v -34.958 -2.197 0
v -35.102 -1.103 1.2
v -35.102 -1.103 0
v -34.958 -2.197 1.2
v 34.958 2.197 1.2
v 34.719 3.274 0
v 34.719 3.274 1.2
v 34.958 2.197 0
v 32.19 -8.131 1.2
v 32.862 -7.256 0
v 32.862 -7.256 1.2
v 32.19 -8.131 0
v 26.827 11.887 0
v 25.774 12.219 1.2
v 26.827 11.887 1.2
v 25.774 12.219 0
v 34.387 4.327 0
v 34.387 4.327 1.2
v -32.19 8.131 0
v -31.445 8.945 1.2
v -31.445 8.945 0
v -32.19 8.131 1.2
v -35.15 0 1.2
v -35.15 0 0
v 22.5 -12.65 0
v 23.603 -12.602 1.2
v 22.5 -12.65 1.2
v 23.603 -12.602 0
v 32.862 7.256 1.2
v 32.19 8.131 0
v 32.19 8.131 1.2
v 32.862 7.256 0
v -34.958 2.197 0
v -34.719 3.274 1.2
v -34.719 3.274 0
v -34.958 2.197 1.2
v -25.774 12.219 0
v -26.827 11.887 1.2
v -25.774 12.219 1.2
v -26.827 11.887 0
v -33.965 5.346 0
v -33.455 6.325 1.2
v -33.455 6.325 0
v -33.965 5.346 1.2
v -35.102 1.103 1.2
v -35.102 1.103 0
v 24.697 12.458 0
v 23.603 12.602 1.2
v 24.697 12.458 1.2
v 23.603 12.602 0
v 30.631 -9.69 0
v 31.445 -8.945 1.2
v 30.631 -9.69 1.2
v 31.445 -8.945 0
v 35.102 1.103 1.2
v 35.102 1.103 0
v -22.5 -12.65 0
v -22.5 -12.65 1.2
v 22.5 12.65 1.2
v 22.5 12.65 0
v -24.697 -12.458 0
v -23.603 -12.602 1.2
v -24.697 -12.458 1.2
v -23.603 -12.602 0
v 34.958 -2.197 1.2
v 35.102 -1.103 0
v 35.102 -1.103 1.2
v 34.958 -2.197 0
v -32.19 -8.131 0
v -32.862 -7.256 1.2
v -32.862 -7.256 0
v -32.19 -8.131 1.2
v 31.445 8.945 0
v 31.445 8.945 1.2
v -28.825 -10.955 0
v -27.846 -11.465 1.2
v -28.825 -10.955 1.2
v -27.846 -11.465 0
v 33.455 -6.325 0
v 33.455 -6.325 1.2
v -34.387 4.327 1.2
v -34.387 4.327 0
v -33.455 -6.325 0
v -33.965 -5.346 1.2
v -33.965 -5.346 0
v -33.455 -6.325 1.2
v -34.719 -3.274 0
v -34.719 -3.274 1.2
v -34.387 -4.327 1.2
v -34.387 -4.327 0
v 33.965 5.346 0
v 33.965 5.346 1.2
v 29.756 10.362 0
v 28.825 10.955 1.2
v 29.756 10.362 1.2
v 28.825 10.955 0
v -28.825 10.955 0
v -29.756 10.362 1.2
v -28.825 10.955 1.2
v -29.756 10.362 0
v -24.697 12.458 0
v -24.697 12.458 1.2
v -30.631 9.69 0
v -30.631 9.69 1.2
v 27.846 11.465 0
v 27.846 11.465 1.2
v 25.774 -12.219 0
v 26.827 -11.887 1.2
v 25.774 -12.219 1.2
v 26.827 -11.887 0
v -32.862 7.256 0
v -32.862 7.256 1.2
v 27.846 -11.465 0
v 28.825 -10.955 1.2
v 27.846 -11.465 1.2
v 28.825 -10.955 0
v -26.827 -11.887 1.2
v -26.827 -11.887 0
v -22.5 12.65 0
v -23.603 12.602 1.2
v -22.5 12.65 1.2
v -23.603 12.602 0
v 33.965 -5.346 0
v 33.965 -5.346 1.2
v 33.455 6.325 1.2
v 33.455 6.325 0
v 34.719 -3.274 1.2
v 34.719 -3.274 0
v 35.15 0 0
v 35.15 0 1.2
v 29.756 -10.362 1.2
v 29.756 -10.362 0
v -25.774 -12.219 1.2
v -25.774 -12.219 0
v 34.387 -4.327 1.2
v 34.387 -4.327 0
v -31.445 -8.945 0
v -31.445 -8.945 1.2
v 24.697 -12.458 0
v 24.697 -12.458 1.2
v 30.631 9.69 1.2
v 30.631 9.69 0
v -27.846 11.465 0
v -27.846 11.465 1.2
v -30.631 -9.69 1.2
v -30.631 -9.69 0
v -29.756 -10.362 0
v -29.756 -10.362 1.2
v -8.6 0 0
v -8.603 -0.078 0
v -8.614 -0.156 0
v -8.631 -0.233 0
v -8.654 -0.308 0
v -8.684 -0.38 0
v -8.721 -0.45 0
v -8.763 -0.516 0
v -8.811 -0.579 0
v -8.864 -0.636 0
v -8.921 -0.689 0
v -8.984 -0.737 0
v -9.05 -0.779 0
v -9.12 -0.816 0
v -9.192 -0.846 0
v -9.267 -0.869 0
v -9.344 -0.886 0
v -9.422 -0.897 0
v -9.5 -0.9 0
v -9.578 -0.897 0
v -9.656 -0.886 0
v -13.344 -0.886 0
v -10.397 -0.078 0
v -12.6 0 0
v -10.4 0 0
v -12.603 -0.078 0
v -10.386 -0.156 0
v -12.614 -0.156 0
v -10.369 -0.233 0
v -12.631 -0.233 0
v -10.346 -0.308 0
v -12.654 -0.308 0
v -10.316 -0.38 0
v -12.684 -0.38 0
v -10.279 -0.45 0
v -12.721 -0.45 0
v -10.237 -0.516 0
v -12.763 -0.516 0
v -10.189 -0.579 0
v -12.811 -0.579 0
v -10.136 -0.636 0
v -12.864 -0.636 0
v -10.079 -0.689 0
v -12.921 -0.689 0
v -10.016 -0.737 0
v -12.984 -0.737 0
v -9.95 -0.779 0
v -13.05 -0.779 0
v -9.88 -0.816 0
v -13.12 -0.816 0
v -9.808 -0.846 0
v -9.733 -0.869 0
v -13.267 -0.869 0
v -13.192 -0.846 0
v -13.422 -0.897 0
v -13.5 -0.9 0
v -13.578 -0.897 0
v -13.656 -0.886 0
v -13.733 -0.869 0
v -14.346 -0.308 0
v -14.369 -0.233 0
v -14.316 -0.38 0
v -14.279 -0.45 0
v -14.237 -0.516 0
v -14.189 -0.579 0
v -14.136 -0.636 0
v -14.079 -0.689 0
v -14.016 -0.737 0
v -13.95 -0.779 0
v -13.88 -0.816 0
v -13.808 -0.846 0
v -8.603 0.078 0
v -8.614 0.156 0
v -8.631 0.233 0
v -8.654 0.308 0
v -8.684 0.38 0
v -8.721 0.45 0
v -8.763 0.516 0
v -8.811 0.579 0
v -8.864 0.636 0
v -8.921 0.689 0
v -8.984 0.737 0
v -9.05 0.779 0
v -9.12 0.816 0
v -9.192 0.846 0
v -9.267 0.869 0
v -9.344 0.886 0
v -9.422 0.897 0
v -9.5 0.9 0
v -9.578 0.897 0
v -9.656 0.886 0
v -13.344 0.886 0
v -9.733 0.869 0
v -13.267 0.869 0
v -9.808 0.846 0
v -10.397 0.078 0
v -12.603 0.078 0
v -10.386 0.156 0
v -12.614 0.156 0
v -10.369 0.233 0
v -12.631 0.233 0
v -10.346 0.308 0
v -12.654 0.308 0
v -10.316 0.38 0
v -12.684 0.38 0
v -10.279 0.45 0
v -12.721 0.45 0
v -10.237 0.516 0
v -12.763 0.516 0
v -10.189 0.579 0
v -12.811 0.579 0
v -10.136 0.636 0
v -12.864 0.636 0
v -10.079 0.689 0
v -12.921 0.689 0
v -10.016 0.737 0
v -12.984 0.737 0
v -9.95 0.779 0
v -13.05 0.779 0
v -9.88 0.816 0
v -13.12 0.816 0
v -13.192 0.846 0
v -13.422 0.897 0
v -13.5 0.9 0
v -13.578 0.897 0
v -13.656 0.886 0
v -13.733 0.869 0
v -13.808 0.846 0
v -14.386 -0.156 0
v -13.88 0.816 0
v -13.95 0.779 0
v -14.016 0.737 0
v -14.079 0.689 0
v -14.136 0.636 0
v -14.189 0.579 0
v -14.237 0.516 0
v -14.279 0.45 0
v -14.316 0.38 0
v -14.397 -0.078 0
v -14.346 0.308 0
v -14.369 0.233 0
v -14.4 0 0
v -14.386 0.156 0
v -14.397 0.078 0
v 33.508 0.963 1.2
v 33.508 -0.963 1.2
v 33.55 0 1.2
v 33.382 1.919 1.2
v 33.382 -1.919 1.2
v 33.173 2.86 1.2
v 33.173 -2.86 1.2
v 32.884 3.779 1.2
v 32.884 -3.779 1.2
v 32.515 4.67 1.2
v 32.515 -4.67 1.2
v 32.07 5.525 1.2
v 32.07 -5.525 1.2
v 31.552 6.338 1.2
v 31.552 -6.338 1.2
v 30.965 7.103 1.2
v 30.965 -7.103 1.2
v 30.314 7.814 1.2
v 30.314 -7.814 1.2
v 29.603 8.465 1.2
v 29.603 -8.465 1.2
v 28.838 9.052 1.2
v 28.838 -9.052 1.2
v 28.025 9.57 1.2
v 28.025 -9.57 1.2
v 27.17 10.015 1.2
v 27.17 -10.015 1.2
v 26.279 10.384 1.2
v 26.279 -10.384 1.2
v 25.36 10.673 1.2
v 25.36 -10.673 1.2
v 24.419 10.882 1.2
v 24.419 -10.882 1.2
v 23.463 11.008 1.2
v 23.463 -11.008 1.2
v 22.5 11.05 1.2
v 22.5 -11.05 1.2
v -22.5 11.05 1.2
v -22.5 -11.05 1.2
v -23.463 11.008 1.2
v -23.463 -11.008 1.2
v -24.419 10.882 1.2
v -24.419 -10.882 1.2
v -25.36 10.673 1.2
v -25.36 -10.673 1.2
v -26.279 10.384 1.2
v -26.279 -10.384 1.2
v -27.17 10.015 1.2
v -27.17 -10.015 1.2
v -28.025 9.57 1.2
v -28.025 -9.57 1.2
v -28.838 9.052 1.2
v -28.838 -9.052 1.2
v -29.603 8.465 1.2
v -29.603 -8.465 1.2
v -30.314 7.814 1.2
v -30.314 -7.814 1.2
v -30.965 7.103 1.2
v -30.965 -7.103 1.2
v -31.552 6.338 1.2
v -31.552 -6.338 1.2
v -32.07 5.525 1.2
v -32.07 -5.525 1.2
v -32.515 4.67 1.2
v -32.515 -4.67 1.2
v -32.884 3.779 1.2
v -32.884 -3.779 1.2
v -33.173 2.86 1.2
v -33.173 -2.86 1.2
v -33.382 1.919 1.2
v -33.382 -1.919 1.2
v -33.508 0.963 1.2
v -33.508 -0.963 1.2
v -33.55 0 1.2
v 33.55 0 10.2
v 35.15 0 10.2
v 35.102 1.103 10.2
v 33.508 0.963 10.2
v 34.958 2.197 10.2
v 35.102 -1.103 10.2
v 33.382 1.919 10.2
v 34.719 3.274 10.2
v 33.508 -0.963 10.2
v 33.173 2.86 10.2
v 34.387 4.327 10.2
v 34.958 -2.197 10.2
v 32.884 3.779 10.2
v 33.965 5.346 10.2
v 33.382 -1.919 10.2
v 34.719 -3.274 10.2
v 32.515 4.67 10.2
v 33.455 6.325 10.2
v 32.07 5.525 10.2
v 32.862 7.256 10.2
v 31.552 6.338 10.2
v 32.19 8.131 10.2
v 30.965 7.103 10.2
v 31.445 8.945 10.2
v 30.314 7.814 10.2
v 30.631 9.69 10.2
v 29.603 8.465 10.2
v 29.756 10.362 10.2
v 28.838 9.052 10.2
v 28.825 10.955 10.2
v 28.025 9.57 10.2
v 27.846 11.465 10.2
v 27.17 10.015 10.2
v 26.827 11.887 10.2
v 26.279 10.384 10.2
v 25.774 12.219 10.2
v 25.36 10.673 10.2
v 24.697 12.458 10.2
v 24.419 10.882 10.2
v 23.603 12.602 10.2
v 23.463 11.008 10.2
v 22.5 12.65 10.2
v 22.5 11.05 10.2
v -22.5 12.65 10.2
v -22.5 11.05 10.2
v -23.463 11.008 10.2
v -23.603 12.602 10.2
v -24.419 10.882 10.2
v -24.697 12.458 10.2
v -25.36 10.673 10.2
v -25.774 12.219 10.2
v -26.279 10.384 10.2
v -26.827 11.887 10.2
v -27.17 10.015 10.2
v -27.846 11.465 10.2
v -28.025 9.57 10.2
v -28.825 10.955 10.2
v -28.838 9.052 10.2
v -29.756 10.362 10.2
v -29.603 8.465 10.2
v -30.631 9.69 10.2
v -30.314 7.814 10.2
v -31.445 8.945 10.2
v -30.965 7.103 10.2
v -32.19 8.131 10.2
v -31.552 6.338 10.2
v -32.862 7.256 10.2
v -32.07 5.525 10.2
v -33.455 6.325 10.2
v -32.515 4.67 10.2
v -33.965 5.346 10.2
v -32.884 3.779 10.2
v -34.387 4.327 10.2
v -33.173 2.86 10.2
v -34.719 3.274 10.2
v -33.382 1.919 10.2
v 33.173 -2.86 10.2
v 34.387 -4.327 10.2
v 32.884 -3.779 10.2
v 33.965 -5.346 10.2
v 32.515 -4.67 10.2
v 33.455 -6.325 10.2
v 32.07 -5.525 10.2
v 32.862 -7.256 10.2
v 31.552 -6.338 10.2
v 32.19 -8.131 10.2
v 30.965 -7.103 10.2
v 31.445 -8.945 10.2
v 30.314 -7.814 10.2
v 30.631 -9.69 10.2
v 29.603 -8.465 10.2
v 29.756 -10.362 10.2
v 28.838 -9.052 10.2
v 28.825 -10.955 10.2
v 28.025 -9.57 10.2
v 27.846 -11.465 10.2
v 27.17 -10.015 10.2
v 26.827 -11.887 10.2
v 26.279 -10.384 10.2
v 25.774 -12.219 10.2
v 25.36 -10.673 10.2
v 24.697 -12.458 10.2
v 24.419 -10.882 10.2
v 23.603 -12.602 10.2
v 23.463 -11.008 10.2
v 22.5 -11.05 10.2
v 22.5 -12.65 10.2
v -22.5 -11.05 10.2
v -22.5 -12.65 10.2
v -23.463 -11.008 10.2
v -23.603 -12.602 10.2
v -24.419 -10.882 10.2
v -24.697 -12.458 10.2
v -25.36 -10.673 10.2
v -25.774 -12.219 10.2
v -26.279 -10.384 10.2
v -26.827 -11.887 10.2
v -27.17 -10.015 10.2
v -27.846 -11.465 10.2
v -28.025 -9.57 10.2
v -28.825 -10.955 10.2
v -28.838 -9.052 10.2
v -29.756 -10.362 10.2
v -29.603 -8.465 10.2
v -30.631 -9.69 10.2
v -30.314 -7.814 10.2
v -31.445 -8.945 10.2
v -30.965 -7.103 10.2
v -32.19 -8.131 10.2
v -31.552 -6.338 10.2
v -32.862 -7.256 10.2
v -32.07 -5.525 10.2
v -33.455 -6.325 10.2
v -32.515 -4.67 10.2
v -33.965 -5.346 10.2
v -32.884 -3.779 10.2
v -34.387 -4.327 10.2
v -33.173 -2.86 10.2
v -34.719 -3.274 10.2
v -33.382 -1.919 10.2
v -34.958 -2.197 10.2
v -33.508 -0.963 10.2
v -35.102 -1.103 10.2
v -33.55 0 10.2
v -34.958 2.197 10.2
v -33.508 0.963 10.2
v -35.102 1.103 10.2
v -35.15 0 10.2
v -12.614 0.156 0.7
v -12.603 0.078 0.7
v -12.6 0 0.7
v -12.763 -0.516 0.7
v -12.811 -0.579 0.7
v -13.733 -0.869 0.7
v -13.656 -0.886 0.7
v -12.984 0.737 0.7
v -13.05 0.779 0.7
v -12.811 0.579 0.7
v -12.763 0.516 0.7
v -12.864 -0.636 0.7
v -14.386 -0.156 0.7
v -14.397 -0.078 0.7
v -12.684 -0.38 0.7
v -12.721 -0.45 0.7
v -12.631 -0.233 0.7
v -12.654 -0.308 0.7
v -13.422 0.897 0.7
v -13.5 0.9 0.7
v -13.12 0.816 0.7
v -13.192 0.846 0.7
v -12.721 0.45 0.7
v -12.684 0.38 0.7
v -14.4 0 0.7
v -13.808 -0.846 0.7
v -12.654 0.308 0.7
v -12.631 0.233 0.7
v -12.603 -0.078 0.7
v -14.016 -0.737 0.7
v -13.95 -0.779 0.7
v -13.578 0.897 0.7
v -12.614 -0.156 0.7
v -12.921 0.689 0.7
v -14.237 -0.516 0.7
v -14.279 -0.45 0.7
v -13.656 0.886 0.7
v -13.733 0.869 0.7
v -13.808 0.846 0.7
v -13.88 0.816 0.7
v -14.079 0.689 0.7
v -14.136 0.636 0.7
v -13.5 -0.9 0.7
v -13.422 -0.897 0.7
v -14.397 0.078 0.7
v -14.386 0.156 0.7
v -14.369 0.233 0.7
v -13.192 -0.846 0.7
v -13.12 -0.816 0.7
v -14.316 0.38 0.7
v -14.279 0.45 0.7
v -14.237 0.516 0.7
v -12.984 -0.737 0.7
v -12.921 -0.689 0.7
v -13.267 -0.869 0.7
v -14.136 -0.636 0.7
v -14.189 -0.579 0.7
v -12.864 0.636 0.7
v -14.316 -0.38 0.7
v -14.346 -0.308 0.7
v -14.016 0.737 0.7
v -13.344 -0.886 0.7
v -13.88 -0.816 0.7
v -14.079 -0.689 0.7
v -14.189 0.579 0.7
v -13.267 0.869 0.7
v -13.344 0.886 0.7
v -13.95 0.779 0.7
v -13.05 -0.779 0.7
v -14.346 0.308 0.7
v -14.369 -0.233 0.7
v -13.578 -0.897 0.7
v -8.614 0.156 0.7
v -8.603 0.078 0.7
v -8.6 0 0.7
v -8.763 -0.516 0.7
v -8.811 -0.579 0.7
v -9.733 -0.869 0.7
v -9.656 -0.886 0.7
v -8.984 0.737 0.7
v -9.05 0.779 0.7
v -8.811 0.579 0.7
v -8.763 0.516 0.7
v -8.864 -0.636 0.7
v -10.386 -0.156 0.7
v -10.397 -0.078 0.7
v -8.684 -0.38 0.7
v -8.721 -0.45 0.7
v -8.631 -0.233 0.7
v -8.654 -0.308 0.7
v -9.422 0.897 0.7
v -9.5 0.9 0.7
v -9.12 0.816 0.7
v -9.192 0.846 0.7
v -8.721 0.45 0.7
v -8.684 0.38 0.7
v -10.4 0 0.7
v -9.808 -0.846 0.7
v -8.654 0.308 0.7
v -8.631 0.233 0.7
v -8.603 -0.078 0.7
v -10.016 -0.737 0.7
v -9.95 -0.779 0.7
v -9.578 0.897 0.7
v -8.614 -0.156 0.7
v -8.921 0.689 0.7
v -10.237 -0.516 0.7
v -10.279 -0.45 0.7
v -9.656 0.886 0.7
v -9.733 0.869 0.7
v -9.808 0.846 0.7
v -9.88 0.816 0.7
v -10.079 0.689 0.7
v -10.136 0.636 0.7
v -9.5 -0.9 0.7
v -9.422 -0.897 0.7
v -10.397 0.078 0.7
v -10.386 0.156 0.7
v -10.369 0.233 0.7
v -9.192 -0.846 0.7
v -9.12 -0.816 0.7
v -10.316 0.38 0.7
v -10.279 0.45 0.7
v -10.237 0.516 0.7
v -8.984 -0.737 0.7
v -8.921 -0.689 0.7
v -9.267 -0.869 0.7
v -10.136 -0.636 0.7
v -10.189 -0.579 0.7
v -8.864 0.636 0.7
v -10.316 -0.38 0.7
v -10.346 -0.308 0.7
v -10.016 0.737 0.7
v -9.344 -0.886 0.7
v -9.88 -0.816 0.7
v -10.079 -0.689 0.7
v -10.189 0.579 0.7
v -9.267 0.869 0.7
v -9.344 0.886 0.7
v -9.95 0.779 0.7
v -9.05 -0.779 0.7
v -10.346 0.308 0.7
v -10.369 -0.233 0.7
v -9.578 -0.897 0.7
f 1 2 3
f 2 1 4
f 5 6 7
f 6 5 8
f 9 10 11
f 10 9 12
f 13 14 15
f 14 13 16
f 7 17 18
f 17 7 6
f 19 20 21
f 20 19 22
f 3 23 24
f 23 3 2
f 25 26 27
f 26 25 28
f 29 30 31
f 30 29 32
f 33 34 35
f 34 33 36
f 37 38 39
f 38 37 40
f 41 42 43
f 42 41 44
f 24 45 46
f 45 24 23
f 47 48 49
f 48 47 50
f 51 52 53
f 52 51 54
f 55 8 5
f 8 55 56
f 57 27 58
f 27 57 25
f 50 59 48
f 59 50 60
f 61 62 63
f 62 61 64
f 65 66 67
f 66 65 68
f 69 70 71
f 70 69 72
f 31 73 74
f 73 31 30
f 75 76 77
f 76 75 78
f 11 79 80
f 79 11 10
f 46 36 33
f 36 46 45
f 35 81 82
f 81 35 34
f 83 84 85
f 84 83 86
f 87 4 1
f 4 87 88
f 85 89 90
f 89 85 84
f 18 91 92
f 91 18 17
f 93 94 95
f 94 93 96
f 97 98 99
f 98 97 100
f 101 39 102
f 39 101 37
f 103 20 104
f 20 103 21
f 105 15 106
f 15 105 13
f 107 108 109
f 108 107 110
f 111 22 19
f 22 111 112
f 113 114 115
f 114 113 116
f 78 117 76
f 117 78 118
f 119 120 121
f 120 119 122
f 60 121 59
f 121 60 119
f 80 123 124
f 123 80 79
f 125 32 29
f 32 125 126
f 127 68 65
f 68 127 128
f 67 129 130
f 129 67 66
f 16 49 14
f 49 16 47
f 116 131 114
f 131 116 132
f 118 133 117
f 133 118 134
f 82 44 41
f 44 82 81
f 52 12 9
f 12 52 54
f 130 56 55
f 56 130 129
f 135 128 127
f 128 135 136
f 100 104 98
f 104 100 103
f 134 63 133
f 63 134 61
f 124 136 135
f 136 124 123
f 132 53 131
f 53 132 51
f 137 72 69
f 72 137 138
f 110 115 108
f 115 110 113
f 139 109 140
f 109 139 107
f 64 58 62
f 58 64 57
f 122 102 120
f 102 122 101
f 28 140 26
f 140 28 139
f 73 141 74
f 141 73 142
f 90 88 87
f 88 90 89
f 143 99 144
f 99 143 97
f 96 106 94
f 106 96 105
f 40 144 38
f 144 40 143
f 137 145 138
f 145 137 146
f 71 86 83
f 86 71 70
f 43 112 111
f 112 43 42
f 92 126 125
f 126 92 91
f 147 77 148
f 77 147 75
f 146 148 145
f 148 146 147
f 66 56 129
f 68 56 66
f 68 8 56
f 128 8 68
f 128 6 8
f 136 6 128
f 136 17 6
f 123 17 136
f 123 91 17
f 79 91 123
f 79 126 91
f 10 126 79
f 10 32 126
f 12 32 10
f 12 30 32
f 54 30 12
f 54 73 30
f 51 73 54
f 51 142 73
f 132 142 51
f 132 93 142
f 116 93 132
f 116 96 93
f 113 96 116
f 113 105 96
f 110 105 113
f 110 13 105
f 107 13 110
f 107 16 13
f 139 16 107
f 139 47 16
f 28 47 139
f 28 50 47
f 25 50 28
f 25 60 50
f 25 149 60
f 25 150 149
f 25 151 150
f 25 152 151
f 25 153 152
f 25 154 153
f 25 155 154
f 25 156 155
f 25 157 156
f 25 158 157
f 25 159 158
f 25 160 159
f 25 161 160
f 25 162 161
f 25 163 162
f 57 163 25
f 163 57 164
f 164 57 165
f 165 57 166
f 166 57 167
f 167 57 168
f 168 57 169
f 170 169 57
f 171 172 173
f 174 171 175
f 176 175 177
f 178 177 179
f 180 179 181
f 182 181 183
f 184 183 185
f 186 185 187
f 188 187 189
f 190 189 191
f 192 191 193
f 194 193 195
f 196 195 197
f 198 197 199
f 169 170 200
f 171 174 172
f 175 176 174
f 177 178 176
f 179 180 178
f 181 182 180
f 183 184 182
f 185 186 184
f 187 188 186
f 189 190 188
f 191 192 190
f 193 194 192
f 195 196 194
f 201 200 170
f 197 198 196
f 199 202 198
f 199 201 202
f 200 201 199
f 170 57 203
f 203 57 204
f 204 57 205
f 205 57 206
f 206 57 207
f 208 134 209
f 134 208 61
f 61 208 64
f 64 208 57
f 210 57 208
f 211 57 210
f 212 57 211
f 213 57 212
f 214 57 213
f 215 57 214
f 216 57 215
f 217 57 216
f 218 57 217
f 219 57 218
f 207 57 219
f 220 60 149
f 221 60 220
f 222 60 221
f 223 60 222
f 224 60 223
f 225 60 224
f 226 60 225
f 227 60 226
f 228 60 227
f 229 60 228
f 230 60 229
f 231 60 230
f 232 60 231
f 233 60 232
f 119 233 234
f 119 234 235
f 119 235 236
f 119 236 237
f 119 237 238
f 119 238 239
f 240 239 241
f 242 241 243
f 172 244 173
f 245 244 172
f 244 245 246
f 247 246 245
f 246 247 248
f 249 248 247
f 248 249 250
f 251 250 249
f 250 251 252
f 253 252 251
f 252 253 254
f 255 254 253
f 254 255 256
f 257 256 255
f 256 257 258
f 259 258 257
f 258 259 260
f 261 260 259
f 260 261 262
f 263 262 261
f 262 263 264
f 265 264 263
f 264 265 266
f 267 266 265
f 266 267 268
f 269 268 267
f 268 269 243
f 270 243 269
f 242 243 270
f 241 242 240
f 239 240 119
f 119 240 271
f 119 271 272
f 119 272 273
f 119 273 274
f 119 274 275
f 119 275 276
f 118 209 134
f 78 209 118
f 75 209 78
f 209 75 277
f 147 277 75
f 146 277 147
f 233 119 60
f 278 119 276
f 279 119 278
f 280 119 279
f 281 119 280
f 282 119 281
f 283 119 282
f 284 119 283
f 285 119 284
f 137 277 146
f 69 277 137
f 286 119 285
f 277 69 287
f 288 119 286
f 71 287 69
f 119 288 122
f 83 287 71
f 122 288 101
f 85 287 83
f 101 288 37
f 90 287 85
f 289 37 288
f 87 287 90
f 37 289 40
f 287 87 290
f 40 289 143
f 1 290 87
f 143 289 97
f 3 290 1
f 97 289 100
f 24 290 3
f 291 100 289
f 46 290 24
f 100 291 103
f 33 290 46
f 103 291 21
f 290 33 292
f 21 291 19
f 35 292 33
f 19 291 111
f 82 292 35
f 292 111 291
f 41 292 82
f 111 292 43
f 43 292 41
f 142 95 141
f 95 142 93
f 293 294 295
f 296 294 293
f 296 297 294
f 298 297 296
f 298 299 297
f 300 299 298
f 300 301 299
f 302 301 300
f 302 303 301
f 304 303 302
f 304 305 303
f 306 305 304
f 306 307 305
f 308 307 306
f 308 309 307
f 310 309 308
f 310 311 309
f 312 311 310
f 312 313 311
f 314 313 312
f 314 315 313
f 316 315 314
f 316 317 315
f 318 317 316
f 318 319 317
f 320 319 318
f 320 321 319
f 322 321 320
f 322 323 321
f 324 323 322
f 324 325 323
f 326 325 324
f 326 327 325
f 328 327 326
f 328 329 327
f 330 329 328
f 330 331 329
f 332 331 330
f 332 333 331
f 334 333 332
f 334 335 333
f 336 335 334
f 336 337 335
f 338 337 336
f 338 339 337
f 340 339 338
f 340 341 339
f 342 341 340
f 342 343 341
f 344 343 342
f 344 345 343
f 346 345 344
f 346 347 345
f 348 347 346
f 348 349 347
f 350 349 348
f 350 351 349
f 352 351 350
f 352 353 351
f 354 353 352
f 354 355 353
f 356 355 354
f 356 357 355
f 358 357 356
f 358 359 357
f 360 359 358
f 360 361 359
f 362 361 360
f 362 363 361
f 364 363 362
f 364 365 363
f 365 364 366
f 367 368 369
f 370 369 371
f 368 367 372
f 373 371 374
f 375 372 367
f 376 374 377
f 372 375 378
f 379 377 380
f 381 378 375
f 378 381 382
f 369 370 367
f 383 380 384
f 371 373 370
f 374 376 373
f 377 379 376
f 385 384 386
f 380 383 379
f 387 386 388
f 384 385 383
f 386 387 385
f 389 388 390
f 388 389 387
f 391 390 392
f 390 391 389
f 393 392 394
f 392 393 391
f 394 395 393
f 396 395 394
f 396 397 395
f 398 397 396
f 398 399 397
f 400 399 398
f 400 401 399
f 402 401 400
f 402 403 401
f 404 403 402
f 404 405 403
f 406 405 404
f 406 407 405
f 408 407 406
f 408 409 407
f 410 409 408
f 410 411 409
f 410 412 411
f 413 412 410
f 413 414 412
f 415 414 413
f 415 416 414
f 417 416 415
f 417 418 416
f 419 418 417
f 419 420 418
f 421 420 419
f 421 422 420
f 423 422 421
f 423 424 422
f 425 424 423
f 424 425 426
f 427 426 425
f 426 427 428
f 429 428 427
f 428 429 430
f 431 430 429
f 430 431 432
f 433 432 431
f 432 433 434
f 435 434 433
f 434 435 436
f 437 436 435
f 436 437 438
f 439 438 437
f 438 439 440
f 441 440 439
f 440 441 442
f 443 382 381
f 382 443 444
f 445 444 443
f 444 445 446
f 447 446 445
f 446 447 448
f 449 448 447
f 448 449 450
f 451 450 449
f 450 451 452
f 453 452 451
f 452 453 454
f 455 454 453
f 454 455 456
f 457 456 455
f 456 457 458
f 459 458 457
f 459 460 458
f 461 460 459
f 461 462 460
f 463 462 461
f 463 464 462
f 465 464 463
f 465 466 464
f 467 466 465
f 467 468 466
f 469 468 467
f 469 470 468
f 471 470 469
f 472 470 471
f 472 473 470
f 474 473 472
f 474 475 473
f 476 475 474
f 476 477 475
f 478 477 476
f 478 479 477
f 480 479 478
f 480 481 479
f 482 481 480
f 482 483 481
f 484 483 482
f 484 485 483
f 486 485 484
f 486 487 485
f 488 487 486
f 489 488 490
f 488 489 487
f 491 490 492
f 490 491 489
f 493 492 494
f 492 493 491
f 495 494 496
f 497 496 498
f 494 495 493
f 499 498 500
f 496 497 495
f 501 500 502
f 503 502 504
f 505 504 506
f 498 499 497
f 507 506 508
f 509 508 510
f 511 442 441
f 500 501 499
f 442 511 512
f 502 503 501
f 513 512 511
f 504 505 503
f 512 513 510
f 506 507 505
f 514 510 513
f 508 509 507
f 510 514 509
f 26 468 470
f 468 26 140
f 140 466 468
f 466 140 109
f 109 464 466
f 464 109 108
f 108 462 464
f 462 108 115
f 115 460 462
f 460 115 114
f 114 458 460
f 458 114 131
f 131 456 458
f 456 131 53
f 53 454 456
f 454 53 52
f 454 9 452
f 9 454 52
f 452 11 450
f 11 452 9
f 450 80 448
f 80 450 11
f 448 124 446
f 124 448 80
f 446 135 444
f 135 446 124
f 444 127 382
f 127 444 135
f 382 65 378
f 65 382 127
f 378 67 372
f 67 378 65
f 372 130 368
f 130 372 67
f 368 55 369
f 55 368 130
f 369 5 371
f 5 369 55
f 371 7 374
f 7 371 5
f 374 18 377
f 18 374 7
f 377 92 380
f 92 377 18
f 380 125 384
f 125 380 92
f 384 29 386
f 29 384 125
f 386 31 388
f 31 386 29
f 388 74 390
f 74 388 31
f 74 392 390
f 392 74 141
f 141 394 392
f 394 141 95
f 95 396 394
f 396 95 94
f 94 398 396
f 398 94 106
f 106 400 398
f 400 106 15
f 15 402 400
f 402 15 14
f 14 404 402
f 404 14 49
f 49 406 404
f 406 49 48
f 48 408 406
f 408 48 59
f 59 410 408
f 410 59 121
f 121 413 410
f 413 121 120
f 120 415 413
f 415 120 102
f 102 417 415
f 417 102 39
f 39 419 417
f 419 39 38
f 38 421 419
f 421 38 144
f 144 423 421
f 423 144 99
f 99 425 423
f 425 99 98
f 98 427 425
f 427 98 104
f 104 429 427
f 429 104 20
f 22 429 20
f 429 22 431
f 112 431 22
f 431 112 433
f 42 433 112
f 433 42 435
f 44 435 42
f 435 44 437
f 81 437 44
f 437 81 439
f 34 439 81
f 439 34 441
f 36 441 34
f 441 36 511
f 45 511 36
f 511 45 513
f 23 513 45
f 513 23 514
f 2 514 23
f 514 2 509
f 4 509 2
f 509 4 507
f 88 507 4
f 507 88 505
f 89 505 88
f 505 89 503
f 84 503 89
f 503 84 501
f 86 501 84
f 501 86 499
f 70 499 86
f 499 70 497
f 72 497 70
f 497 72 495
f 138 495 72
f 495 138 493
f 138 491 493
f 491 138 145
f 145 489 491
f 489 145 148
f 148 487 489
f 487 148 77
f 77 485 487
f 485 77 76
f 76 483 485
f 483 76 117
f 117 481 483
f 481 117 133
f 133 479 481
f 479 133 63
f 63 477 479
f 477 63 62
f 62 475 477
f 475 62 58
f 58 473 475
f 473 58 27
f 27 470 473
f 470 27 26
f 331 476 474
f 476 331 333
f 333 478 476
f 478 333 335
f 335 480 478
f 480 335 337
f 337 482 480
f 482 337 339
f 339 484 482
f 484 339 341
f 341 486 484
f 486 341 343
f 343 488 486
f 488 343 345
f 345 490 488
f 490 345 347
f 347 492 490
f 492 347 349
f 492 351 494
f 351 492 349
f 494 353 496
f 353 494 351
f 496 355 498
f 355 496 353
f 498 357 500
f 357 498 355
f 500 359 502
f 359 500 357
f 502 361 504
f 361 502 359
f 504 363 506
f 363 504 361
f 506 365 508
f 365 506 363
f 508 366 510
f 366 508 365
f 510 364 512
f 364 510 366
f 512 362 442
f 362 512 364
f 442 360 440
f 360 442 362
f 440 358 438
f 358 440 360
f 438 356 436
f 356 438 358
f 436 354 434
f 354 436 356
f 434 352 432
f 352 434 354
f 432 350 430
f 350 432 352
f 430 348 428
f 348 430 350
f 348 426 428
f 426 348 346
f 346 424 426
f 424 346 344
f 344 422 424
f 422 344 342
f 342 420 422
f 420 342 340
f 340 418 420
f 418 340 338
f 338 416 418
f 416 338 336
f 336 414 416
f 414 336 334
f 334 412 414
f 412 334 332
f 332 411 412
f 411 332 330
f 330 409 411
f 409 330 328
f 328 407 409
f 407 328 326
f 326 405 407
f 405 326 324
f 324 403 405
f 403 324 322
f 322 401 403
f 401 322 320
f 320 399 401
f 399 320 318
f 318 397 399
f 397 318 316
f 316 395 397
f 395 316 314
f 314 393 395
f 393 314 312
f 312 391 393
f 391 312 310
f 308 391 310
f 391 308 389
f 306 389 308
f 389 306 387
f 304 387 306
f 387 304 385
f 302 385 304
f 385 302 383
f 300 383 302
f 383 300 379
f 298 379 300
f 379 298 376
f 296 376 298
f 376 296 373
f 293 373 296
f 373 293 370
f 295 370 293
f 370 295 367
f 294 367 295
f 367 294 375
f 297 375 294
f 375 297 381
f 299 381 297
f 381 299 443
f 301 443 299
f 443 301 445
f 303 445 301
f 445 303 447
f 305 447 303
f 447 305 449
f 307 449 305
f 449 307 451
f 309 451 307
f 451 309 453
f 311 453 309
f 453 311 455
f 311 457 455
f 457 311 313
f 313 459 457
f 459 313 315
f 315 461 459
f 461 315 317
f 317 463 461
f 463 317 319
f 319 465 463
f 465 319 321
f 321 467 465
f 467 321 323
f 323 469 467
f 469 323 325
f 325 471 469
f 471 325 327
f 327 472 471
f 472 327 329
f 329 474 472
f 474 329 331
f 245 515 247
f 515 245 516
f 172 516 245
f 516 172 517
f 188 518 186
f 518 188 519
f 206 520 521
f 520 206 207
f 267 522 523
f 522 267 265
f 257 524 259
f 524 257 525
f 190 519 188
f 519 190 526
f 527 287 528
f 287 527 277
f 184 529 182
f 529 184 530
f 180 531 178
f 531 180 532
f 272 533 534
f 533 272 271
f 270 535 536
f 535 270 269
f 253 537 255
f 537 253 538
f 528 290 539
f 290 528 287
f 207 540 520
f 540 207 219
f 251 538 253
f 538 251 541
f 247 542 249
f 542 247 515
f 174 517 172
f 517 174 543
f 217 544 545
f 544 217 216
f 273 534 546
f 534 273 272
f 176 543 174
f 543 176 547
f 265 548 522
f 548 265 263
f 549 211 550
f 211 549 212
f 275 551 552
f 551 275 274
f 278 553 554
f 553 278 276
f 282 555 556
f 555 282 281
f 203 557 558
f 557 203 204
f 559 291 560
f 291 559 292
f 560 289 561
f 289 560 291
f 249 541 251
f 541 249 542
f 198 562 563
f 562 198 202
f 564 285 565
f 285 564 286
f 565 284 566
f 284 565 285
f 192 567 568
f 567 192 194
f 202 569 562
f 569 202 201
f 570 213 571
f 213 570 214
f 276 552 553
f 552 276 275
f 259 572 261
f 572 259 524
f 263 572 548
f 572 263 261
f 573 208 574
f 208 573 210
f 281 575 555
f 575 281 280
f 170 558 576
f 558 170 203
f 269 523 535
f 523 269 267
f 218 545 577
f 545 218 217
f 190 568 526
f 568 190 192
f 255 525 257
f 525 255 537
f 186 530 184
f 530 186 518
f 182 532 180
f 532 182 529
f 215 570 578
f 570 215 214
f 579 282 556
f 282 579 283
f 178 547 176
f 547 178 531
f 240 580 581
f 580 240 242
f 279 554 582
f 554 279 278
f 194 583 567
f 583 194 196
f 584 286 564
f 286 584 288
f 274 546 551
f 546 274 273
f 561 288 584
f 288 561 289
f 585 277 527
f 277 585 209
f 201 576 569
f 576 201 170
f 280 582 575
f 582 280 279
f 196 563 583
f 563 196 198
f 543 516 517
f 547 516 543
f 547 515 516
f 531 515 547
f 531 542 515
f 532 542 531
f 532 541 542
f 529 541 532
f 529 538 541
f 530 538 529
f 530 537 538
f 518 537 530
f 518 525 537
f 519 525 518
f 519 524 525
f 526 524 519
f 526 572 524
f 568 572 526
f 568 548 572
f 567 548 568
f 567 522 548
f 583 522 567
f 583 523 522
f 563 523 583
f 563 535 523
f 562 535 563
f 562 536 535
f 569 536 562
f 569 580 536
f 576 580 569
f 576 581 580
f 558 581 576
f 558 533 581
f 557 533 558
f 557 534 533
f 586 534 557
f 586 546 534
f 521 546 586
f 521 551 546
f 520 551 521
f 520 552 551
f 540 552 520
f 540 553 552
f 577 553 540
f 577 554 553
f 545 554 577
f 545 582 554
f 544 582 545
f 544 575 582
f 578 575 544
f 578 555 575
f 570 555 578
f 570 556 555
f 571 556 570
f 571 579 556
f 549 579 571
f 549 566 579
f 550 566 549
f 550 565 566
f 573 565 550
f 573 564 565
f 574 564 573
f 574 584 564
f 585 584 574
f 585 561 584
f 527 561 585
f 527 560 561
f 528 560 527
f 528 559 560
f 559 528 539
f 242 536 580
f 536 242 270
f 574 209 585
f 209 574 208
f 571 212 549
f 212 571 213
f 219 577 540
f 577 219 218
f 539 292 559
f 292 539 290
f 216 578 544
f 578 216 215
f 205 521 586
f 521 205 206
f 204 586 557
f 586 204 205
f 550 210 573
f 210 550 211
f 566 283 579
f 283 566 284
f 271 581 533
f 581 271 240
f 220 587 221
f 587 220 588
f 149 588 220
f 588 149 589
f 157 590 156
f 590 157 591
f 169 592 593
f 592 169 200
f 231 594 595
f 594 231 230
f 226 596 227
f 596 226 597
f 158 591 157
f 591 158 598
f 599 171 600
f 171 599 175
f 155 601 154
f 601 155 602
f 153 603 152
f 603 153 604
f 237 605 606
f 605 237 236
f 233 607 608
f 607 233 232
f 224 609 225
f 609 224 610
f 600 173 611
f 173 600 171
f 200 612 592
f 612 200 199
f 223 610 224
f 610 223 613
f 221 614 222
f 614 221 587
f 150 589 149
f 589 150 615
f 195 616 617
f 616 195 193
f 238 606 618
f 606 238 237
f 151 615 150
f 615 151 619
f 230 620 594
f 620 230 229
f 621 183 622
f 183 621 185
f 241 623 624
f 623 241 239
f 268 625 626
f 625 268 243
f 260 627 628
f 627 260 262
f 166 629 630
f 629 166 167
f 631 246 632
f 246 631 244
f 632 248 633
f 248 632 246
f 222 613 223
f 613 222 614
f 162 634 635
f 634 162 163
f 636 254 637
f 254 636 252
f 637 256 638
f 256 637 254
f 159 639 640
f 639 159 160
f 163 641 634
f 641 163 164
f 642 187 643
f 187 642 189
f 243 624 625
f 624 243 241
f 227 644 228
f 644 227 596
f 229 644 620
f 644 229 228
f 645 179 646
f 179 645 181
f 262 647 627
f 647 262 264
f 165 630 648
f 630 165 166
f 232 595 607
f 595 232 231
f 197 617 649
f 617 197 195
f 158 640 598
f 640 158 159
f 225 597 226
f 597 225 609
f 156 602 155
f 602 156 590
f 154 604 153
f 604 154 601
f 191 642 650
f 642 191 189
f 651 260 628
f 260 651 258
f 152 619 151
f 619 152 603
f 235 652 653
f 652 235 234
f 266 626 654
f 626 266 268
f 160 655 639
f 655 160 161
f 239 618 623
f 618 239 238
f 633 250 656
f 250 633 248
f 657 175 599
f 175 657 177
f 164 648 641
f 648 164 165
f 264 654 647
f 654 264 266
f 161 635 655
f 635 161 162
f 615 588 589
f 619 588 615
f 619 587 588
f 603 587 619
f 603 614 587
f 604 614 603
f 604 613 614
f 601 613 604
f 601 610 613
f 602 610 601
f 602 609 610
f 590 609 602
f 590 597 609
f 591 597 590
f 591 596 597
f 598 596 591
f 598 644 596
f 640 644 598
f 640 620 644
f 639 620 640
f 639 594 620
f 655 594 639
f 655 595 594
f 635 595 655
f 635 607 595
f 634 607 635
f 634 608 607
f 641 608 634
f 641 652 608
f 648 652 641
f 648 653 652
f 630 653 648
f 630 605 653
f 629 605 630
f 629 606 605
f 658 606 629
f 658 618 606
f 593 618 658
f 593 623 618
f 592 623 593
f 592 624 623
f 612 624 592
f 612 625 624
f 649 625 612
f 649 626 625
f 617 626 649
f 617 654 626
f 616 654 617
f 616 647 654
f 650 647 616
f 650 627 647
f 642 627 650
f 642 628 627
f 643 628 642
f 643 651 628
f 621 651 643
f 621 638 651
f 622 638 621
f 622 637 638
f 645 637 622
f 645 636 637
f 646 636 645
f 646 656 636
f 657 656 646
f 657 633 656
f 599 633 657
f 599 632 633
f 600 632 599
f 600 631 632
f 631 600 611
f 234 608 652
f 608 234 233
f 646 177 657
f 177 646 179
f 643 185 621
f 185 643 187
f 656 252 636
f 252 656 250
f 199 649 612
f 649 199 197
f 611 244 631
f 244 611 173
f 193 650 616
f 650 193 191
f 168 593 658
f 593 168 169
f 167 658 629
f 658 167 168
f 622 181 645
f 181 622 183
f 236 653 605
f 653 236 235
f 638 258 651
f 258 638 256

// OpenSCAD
// file: ../bolt.scad
bolt_pts  = [[155.0,300.0], [75.0,180.0], [130.0,180.0], [45.0,30.0]];
pixel_pts = [[155.0,300.0], [145.5,285.8], [136.0,271.5], [126.5,257.2], [117.0,243.0], [107.5,228.8], [98.0,214.5], [88.5,200.2], [79.0,186.0], [95.1,180.0], [112.3,180.0], [129.4,180.0], [121.4,164.8], [113.0,149.9], [104.5,135.1], [96.1,120.2], [87.6,105.3], [79.2,90.4], [70.8,75.5], [62.3,60.6], [53.9,45.7], [45.4,30.8]];

// ===== CHARGE lightning-bolt test piece — option C (~18mm channel) =====
bolt_inner     = 18;                       // channel interior (collar O16 fits)
bolt_wall      = 2;                         // wall thickness
bolt_outer     = bolt_inner + 2*bolt_wall; // 22mm outer stroke
bolt_gap       = 15;                       // LED-tip -> lens
bolt_ch_h      = dome_clear + bolt_gap;    // wall height above plate
bolt_lens_t    = 1.5;                       // lens face thickness
bolt_lip_h     = 2;                         // lens locating lip depth
bolt_lip_clear = 0.6;                       // lip clearance into channel
bolt_lip_t     = 1.2;                       // lip wall thickness

module bolt_stroke(w) {
    for (i = [0 : len(bolt_pts) - 2])
        hull() {
            translate(bolt_pts[i])     circle(d = w);
            translate(bolt_pts[i + 1]) circle(d = w);
        }
}

// wall_h = channel wall height above the plate (gap = wall_h - dome_clear).
// The lens caps the cross-section, so the SAME lens fits any wall_h.
module bolt_shell(wall_h = bolt_ch_h) {
    difference() {
        union() {
            linear_extrude(plate_t) bolt_stroke(bolt_outer);
            translate([0, 0, plate_t]) linear_extrude(wall_h)
                difference() { bolt_stroke(bolt_outer); bolt_stroke(bolt_inner); }
        }
        for (p = pixel_pts)
            translate([p[0], p[1], -0.1]) cylinder(h = plate_t + 0.2, d = pixel_through);
    }
    for (p = pixel_pts) place_collar(p[0], p[1]);
}

module bolt_lens() {
    union() {
        linear_extrude(bolt_lens_t) bolt_stroke(bolt_outer);
        translate([0, 0, bolt_lens_t]) linear_extrude(bolt_lip_h)
            difference() {
                bolt_stroke(bolt_inner - bolt_lip_clear);
                bolt_stroke(bolt_inner - bolt_lip_clear - 2 * bolt_lip_t);
            }
    }
}

// ----- snap-OVER lens: a cap that wraps the WHOLE bolt outside (skirt grips the
// 22mm outer wall). Works because the bolt is a single isolated piece. Top = the
// diffuser face. Print top-down, flip in use; fits any bolt height.
// 2-filament: clear for the first cap_top_t (top), white above (skirt) via a
// slicer height color-change. 3-filament: also paint the skirt's outer wall black.
cap_clear   = 0.3;   // skirt-inner = bolt_outer + this (slide/snap over)
cap_wall    = 1.6;   // skirt wall thickness
cap_top_t   = 1.2;   // diffuser top thickness
cap_skirt_h = 9;     // how far the skirt wraps down the bolt sides

module bolt_overcap() {
    si = bolt_outer + cap_clear;
    so = si + 2 * cap_wall;
    union() {
        linear_extrude(cap_top_t) bolt_stroke(so);
        translate([0, 0, cap_top_t]) linear_extrude(cap_skirt_h)
            difference() { bolt_stroke(so); bolt_stroke(si); }
    }
}

// Fit-test chunk: a short straight section of the over-cap at a chosen skirt
// clearance. Slide it onto a straight part of the printed bolt to feel the fit.
// `marks` debossed dots on the bed face = which one it is (more dots = tighter).
module cap_chunk(clear, marks, L = 45) {
    si = bolt_outer + clear;
    so = si + 2 * cap_wall;
    difference() {
        union() {
            linear_extrude(cap_top_t)
                hull() { translate([-L/2,0]) circle(d=so); translate([L/2,0]) circle(d=so); }
            translate([0,0,cap_top_t]) linear_extrude(cap_skirt_h)
                difference() {
                    hull() { translate([-L/2,0]) circle(d=so); translate([L/2,0]) circle(d=so); }
                    hull() { translate([-L/2,0]) circle(d=si); translate([L/2,0]) circle(d=si); }
                }
        }
        for (i = [0 : marks - 1])
            translate([-L/2 + 9 + i*4, 0, -0.1]) cylinder(h = 0.8, d = 1.8);
    }
}
// file: ../collar.scad
// Calibrated press-fit collar, merged into the rear wall at each pixel.
// The STL is symmetric top/bottom (retention lip at mid-height), so insertion
// direction does not matter. Native STL sits X-centered at collar_cx, Z 0..collar_h.

module collar_solid() {
    translate([-collar_cx, 0, 0])
        import(collar_stl, convexity = 6);
}

module place_collar(x, y) {
    translate([x, y, 0]) collar_solid();
}
// file: ../config.scad
// ===== CHARGE LED sign — global config =====
// Edit this file; then run ./build.sh to regenerate every STL.

$fn = 72;

// ---- calibrated collar (press-fit for 12mm bullet pixel) ----
collar_stl    = "../../assets/bullet-collar.stl"; // path resolved from src/parts/ entry files
collar_h      = 2.0;     // Z span of the collar STL
collar_od     = 16.0;    // collar outer diameter
collar_cx     = 43.0;    // STL native X center (Y center is 0)
pixel_through = 12.3;    // clearance hole through the plate (just over bore Ø12.19)
dome_clear    = 4.0;     // dome protrusion above plate front. Spec: 5.5mm dome-tip-to-flange,
                         // flange seats on plate back, minus 2mm plate ~= 3.5-4mm. Seat a real
                         // pixel and measure to lock it in.

// ---- shell ----
plate_t    = 2.0;        // rear plate thickness (== collar_h, so the collar sits flush)
wall_t     = 2.5;        // chimney wall thickness
cell_inner = 30;         // square interior of each test cell (the press-fit opening)

// ---- diffuser panels (flat, drop-in — kept for the final glued option) ----
panel_press_clear = 0.25; // panel is this much SMALLER than the opening (total) -> friction fit
panel_thicks      = [1, 2, 3];

// ---- diffuser CAP (slides over an ISOLATED chimney; not used on touching rows) ----
cap_fit_clear = 0.4;   // skirt-inner minus chimney-outer (total); bigger = looser slide
cap_skirt_t   = 1.6;   // skirt wall thickness
cap_skirt_h   = 7;     // how far the skirt grips down over the chimney

// ---- diffuser LID = flanged plug (plug locates in the opening, flange catches on the rim) ----
lid_flange_cover = wall_t;  // flange overhang per side ~= wall width (rests on rim, can't fall in)
lid_flange_gap   = 0.3;     // shrink the flange a hair so neighbour lids don't clash
lid_plug_h       = 4;       // how far the plug drops into the opening (0 = plain flat tile)
lid_plug_clear   = 0.2;     // plug-outer = opening minus this (total) -> friction fit
                            // (was 0.5/loose; PETG plug in a PLA hole grips well at 0.2)
lid_plug_wall    = 1.5;     // plug-frame wall thickness

// ---- coupon depth ladder ----
led_gaps = [10, 15, 20]; // clear LED-tip -> diffuser distance, per cell (mm)
                         // (was [20,35,50] — 35/50 went too dim/washed; 20 is the new max)

// ---- collar v2: original bore + lip, plus a 45-deg lead-in chamfer ----
bore_face_r   = 6.10;    // collar bore radius at each face (~Ø12.2)
chamfer_depth = 0.5;     // axial depth of the 45-deg lead-in at each face
mouth_r       = bore_face_r + chamfer_depth;  // chamfer mouth radius (~Ø13.2)

// ---- collar A/B test harness ----
harness_w     = 52;      // tile width
harness_d     = 30;      // tile depth
harness_t     = plate_t; // match the real wall thickness for a faithful fit test
harness_pitch = 24;      // spacing between the two hole centers

// ---- derived ----
cell_pitch = cell_inner + 2 * wall_t;      // outer cell footprint (35)
n_cells    = len(led_gaps);
plate_w    = n_cells * cell_pitch;
plate_d    = cell_pitch;
panel_side = cell_inner - panel_press_clear;
function cell_x(i)     = i * cell_pitch + cell_pitch / 2;   // column center (distance)
function cell_y(j)     = j * cell_pitch + cell_pitch / 2;   // row center (for grid coupons)
function chimney_H(i)  = plate_t + dome_clear + led_gaps[i];
// main file
// Fit test: over-cap skirt clearance 0.1mm (2 dots). Middle.
include <../config.scad>
include <../collar.scad>
include <../bolt.scad>
cap_chunk(0.1, 2);
